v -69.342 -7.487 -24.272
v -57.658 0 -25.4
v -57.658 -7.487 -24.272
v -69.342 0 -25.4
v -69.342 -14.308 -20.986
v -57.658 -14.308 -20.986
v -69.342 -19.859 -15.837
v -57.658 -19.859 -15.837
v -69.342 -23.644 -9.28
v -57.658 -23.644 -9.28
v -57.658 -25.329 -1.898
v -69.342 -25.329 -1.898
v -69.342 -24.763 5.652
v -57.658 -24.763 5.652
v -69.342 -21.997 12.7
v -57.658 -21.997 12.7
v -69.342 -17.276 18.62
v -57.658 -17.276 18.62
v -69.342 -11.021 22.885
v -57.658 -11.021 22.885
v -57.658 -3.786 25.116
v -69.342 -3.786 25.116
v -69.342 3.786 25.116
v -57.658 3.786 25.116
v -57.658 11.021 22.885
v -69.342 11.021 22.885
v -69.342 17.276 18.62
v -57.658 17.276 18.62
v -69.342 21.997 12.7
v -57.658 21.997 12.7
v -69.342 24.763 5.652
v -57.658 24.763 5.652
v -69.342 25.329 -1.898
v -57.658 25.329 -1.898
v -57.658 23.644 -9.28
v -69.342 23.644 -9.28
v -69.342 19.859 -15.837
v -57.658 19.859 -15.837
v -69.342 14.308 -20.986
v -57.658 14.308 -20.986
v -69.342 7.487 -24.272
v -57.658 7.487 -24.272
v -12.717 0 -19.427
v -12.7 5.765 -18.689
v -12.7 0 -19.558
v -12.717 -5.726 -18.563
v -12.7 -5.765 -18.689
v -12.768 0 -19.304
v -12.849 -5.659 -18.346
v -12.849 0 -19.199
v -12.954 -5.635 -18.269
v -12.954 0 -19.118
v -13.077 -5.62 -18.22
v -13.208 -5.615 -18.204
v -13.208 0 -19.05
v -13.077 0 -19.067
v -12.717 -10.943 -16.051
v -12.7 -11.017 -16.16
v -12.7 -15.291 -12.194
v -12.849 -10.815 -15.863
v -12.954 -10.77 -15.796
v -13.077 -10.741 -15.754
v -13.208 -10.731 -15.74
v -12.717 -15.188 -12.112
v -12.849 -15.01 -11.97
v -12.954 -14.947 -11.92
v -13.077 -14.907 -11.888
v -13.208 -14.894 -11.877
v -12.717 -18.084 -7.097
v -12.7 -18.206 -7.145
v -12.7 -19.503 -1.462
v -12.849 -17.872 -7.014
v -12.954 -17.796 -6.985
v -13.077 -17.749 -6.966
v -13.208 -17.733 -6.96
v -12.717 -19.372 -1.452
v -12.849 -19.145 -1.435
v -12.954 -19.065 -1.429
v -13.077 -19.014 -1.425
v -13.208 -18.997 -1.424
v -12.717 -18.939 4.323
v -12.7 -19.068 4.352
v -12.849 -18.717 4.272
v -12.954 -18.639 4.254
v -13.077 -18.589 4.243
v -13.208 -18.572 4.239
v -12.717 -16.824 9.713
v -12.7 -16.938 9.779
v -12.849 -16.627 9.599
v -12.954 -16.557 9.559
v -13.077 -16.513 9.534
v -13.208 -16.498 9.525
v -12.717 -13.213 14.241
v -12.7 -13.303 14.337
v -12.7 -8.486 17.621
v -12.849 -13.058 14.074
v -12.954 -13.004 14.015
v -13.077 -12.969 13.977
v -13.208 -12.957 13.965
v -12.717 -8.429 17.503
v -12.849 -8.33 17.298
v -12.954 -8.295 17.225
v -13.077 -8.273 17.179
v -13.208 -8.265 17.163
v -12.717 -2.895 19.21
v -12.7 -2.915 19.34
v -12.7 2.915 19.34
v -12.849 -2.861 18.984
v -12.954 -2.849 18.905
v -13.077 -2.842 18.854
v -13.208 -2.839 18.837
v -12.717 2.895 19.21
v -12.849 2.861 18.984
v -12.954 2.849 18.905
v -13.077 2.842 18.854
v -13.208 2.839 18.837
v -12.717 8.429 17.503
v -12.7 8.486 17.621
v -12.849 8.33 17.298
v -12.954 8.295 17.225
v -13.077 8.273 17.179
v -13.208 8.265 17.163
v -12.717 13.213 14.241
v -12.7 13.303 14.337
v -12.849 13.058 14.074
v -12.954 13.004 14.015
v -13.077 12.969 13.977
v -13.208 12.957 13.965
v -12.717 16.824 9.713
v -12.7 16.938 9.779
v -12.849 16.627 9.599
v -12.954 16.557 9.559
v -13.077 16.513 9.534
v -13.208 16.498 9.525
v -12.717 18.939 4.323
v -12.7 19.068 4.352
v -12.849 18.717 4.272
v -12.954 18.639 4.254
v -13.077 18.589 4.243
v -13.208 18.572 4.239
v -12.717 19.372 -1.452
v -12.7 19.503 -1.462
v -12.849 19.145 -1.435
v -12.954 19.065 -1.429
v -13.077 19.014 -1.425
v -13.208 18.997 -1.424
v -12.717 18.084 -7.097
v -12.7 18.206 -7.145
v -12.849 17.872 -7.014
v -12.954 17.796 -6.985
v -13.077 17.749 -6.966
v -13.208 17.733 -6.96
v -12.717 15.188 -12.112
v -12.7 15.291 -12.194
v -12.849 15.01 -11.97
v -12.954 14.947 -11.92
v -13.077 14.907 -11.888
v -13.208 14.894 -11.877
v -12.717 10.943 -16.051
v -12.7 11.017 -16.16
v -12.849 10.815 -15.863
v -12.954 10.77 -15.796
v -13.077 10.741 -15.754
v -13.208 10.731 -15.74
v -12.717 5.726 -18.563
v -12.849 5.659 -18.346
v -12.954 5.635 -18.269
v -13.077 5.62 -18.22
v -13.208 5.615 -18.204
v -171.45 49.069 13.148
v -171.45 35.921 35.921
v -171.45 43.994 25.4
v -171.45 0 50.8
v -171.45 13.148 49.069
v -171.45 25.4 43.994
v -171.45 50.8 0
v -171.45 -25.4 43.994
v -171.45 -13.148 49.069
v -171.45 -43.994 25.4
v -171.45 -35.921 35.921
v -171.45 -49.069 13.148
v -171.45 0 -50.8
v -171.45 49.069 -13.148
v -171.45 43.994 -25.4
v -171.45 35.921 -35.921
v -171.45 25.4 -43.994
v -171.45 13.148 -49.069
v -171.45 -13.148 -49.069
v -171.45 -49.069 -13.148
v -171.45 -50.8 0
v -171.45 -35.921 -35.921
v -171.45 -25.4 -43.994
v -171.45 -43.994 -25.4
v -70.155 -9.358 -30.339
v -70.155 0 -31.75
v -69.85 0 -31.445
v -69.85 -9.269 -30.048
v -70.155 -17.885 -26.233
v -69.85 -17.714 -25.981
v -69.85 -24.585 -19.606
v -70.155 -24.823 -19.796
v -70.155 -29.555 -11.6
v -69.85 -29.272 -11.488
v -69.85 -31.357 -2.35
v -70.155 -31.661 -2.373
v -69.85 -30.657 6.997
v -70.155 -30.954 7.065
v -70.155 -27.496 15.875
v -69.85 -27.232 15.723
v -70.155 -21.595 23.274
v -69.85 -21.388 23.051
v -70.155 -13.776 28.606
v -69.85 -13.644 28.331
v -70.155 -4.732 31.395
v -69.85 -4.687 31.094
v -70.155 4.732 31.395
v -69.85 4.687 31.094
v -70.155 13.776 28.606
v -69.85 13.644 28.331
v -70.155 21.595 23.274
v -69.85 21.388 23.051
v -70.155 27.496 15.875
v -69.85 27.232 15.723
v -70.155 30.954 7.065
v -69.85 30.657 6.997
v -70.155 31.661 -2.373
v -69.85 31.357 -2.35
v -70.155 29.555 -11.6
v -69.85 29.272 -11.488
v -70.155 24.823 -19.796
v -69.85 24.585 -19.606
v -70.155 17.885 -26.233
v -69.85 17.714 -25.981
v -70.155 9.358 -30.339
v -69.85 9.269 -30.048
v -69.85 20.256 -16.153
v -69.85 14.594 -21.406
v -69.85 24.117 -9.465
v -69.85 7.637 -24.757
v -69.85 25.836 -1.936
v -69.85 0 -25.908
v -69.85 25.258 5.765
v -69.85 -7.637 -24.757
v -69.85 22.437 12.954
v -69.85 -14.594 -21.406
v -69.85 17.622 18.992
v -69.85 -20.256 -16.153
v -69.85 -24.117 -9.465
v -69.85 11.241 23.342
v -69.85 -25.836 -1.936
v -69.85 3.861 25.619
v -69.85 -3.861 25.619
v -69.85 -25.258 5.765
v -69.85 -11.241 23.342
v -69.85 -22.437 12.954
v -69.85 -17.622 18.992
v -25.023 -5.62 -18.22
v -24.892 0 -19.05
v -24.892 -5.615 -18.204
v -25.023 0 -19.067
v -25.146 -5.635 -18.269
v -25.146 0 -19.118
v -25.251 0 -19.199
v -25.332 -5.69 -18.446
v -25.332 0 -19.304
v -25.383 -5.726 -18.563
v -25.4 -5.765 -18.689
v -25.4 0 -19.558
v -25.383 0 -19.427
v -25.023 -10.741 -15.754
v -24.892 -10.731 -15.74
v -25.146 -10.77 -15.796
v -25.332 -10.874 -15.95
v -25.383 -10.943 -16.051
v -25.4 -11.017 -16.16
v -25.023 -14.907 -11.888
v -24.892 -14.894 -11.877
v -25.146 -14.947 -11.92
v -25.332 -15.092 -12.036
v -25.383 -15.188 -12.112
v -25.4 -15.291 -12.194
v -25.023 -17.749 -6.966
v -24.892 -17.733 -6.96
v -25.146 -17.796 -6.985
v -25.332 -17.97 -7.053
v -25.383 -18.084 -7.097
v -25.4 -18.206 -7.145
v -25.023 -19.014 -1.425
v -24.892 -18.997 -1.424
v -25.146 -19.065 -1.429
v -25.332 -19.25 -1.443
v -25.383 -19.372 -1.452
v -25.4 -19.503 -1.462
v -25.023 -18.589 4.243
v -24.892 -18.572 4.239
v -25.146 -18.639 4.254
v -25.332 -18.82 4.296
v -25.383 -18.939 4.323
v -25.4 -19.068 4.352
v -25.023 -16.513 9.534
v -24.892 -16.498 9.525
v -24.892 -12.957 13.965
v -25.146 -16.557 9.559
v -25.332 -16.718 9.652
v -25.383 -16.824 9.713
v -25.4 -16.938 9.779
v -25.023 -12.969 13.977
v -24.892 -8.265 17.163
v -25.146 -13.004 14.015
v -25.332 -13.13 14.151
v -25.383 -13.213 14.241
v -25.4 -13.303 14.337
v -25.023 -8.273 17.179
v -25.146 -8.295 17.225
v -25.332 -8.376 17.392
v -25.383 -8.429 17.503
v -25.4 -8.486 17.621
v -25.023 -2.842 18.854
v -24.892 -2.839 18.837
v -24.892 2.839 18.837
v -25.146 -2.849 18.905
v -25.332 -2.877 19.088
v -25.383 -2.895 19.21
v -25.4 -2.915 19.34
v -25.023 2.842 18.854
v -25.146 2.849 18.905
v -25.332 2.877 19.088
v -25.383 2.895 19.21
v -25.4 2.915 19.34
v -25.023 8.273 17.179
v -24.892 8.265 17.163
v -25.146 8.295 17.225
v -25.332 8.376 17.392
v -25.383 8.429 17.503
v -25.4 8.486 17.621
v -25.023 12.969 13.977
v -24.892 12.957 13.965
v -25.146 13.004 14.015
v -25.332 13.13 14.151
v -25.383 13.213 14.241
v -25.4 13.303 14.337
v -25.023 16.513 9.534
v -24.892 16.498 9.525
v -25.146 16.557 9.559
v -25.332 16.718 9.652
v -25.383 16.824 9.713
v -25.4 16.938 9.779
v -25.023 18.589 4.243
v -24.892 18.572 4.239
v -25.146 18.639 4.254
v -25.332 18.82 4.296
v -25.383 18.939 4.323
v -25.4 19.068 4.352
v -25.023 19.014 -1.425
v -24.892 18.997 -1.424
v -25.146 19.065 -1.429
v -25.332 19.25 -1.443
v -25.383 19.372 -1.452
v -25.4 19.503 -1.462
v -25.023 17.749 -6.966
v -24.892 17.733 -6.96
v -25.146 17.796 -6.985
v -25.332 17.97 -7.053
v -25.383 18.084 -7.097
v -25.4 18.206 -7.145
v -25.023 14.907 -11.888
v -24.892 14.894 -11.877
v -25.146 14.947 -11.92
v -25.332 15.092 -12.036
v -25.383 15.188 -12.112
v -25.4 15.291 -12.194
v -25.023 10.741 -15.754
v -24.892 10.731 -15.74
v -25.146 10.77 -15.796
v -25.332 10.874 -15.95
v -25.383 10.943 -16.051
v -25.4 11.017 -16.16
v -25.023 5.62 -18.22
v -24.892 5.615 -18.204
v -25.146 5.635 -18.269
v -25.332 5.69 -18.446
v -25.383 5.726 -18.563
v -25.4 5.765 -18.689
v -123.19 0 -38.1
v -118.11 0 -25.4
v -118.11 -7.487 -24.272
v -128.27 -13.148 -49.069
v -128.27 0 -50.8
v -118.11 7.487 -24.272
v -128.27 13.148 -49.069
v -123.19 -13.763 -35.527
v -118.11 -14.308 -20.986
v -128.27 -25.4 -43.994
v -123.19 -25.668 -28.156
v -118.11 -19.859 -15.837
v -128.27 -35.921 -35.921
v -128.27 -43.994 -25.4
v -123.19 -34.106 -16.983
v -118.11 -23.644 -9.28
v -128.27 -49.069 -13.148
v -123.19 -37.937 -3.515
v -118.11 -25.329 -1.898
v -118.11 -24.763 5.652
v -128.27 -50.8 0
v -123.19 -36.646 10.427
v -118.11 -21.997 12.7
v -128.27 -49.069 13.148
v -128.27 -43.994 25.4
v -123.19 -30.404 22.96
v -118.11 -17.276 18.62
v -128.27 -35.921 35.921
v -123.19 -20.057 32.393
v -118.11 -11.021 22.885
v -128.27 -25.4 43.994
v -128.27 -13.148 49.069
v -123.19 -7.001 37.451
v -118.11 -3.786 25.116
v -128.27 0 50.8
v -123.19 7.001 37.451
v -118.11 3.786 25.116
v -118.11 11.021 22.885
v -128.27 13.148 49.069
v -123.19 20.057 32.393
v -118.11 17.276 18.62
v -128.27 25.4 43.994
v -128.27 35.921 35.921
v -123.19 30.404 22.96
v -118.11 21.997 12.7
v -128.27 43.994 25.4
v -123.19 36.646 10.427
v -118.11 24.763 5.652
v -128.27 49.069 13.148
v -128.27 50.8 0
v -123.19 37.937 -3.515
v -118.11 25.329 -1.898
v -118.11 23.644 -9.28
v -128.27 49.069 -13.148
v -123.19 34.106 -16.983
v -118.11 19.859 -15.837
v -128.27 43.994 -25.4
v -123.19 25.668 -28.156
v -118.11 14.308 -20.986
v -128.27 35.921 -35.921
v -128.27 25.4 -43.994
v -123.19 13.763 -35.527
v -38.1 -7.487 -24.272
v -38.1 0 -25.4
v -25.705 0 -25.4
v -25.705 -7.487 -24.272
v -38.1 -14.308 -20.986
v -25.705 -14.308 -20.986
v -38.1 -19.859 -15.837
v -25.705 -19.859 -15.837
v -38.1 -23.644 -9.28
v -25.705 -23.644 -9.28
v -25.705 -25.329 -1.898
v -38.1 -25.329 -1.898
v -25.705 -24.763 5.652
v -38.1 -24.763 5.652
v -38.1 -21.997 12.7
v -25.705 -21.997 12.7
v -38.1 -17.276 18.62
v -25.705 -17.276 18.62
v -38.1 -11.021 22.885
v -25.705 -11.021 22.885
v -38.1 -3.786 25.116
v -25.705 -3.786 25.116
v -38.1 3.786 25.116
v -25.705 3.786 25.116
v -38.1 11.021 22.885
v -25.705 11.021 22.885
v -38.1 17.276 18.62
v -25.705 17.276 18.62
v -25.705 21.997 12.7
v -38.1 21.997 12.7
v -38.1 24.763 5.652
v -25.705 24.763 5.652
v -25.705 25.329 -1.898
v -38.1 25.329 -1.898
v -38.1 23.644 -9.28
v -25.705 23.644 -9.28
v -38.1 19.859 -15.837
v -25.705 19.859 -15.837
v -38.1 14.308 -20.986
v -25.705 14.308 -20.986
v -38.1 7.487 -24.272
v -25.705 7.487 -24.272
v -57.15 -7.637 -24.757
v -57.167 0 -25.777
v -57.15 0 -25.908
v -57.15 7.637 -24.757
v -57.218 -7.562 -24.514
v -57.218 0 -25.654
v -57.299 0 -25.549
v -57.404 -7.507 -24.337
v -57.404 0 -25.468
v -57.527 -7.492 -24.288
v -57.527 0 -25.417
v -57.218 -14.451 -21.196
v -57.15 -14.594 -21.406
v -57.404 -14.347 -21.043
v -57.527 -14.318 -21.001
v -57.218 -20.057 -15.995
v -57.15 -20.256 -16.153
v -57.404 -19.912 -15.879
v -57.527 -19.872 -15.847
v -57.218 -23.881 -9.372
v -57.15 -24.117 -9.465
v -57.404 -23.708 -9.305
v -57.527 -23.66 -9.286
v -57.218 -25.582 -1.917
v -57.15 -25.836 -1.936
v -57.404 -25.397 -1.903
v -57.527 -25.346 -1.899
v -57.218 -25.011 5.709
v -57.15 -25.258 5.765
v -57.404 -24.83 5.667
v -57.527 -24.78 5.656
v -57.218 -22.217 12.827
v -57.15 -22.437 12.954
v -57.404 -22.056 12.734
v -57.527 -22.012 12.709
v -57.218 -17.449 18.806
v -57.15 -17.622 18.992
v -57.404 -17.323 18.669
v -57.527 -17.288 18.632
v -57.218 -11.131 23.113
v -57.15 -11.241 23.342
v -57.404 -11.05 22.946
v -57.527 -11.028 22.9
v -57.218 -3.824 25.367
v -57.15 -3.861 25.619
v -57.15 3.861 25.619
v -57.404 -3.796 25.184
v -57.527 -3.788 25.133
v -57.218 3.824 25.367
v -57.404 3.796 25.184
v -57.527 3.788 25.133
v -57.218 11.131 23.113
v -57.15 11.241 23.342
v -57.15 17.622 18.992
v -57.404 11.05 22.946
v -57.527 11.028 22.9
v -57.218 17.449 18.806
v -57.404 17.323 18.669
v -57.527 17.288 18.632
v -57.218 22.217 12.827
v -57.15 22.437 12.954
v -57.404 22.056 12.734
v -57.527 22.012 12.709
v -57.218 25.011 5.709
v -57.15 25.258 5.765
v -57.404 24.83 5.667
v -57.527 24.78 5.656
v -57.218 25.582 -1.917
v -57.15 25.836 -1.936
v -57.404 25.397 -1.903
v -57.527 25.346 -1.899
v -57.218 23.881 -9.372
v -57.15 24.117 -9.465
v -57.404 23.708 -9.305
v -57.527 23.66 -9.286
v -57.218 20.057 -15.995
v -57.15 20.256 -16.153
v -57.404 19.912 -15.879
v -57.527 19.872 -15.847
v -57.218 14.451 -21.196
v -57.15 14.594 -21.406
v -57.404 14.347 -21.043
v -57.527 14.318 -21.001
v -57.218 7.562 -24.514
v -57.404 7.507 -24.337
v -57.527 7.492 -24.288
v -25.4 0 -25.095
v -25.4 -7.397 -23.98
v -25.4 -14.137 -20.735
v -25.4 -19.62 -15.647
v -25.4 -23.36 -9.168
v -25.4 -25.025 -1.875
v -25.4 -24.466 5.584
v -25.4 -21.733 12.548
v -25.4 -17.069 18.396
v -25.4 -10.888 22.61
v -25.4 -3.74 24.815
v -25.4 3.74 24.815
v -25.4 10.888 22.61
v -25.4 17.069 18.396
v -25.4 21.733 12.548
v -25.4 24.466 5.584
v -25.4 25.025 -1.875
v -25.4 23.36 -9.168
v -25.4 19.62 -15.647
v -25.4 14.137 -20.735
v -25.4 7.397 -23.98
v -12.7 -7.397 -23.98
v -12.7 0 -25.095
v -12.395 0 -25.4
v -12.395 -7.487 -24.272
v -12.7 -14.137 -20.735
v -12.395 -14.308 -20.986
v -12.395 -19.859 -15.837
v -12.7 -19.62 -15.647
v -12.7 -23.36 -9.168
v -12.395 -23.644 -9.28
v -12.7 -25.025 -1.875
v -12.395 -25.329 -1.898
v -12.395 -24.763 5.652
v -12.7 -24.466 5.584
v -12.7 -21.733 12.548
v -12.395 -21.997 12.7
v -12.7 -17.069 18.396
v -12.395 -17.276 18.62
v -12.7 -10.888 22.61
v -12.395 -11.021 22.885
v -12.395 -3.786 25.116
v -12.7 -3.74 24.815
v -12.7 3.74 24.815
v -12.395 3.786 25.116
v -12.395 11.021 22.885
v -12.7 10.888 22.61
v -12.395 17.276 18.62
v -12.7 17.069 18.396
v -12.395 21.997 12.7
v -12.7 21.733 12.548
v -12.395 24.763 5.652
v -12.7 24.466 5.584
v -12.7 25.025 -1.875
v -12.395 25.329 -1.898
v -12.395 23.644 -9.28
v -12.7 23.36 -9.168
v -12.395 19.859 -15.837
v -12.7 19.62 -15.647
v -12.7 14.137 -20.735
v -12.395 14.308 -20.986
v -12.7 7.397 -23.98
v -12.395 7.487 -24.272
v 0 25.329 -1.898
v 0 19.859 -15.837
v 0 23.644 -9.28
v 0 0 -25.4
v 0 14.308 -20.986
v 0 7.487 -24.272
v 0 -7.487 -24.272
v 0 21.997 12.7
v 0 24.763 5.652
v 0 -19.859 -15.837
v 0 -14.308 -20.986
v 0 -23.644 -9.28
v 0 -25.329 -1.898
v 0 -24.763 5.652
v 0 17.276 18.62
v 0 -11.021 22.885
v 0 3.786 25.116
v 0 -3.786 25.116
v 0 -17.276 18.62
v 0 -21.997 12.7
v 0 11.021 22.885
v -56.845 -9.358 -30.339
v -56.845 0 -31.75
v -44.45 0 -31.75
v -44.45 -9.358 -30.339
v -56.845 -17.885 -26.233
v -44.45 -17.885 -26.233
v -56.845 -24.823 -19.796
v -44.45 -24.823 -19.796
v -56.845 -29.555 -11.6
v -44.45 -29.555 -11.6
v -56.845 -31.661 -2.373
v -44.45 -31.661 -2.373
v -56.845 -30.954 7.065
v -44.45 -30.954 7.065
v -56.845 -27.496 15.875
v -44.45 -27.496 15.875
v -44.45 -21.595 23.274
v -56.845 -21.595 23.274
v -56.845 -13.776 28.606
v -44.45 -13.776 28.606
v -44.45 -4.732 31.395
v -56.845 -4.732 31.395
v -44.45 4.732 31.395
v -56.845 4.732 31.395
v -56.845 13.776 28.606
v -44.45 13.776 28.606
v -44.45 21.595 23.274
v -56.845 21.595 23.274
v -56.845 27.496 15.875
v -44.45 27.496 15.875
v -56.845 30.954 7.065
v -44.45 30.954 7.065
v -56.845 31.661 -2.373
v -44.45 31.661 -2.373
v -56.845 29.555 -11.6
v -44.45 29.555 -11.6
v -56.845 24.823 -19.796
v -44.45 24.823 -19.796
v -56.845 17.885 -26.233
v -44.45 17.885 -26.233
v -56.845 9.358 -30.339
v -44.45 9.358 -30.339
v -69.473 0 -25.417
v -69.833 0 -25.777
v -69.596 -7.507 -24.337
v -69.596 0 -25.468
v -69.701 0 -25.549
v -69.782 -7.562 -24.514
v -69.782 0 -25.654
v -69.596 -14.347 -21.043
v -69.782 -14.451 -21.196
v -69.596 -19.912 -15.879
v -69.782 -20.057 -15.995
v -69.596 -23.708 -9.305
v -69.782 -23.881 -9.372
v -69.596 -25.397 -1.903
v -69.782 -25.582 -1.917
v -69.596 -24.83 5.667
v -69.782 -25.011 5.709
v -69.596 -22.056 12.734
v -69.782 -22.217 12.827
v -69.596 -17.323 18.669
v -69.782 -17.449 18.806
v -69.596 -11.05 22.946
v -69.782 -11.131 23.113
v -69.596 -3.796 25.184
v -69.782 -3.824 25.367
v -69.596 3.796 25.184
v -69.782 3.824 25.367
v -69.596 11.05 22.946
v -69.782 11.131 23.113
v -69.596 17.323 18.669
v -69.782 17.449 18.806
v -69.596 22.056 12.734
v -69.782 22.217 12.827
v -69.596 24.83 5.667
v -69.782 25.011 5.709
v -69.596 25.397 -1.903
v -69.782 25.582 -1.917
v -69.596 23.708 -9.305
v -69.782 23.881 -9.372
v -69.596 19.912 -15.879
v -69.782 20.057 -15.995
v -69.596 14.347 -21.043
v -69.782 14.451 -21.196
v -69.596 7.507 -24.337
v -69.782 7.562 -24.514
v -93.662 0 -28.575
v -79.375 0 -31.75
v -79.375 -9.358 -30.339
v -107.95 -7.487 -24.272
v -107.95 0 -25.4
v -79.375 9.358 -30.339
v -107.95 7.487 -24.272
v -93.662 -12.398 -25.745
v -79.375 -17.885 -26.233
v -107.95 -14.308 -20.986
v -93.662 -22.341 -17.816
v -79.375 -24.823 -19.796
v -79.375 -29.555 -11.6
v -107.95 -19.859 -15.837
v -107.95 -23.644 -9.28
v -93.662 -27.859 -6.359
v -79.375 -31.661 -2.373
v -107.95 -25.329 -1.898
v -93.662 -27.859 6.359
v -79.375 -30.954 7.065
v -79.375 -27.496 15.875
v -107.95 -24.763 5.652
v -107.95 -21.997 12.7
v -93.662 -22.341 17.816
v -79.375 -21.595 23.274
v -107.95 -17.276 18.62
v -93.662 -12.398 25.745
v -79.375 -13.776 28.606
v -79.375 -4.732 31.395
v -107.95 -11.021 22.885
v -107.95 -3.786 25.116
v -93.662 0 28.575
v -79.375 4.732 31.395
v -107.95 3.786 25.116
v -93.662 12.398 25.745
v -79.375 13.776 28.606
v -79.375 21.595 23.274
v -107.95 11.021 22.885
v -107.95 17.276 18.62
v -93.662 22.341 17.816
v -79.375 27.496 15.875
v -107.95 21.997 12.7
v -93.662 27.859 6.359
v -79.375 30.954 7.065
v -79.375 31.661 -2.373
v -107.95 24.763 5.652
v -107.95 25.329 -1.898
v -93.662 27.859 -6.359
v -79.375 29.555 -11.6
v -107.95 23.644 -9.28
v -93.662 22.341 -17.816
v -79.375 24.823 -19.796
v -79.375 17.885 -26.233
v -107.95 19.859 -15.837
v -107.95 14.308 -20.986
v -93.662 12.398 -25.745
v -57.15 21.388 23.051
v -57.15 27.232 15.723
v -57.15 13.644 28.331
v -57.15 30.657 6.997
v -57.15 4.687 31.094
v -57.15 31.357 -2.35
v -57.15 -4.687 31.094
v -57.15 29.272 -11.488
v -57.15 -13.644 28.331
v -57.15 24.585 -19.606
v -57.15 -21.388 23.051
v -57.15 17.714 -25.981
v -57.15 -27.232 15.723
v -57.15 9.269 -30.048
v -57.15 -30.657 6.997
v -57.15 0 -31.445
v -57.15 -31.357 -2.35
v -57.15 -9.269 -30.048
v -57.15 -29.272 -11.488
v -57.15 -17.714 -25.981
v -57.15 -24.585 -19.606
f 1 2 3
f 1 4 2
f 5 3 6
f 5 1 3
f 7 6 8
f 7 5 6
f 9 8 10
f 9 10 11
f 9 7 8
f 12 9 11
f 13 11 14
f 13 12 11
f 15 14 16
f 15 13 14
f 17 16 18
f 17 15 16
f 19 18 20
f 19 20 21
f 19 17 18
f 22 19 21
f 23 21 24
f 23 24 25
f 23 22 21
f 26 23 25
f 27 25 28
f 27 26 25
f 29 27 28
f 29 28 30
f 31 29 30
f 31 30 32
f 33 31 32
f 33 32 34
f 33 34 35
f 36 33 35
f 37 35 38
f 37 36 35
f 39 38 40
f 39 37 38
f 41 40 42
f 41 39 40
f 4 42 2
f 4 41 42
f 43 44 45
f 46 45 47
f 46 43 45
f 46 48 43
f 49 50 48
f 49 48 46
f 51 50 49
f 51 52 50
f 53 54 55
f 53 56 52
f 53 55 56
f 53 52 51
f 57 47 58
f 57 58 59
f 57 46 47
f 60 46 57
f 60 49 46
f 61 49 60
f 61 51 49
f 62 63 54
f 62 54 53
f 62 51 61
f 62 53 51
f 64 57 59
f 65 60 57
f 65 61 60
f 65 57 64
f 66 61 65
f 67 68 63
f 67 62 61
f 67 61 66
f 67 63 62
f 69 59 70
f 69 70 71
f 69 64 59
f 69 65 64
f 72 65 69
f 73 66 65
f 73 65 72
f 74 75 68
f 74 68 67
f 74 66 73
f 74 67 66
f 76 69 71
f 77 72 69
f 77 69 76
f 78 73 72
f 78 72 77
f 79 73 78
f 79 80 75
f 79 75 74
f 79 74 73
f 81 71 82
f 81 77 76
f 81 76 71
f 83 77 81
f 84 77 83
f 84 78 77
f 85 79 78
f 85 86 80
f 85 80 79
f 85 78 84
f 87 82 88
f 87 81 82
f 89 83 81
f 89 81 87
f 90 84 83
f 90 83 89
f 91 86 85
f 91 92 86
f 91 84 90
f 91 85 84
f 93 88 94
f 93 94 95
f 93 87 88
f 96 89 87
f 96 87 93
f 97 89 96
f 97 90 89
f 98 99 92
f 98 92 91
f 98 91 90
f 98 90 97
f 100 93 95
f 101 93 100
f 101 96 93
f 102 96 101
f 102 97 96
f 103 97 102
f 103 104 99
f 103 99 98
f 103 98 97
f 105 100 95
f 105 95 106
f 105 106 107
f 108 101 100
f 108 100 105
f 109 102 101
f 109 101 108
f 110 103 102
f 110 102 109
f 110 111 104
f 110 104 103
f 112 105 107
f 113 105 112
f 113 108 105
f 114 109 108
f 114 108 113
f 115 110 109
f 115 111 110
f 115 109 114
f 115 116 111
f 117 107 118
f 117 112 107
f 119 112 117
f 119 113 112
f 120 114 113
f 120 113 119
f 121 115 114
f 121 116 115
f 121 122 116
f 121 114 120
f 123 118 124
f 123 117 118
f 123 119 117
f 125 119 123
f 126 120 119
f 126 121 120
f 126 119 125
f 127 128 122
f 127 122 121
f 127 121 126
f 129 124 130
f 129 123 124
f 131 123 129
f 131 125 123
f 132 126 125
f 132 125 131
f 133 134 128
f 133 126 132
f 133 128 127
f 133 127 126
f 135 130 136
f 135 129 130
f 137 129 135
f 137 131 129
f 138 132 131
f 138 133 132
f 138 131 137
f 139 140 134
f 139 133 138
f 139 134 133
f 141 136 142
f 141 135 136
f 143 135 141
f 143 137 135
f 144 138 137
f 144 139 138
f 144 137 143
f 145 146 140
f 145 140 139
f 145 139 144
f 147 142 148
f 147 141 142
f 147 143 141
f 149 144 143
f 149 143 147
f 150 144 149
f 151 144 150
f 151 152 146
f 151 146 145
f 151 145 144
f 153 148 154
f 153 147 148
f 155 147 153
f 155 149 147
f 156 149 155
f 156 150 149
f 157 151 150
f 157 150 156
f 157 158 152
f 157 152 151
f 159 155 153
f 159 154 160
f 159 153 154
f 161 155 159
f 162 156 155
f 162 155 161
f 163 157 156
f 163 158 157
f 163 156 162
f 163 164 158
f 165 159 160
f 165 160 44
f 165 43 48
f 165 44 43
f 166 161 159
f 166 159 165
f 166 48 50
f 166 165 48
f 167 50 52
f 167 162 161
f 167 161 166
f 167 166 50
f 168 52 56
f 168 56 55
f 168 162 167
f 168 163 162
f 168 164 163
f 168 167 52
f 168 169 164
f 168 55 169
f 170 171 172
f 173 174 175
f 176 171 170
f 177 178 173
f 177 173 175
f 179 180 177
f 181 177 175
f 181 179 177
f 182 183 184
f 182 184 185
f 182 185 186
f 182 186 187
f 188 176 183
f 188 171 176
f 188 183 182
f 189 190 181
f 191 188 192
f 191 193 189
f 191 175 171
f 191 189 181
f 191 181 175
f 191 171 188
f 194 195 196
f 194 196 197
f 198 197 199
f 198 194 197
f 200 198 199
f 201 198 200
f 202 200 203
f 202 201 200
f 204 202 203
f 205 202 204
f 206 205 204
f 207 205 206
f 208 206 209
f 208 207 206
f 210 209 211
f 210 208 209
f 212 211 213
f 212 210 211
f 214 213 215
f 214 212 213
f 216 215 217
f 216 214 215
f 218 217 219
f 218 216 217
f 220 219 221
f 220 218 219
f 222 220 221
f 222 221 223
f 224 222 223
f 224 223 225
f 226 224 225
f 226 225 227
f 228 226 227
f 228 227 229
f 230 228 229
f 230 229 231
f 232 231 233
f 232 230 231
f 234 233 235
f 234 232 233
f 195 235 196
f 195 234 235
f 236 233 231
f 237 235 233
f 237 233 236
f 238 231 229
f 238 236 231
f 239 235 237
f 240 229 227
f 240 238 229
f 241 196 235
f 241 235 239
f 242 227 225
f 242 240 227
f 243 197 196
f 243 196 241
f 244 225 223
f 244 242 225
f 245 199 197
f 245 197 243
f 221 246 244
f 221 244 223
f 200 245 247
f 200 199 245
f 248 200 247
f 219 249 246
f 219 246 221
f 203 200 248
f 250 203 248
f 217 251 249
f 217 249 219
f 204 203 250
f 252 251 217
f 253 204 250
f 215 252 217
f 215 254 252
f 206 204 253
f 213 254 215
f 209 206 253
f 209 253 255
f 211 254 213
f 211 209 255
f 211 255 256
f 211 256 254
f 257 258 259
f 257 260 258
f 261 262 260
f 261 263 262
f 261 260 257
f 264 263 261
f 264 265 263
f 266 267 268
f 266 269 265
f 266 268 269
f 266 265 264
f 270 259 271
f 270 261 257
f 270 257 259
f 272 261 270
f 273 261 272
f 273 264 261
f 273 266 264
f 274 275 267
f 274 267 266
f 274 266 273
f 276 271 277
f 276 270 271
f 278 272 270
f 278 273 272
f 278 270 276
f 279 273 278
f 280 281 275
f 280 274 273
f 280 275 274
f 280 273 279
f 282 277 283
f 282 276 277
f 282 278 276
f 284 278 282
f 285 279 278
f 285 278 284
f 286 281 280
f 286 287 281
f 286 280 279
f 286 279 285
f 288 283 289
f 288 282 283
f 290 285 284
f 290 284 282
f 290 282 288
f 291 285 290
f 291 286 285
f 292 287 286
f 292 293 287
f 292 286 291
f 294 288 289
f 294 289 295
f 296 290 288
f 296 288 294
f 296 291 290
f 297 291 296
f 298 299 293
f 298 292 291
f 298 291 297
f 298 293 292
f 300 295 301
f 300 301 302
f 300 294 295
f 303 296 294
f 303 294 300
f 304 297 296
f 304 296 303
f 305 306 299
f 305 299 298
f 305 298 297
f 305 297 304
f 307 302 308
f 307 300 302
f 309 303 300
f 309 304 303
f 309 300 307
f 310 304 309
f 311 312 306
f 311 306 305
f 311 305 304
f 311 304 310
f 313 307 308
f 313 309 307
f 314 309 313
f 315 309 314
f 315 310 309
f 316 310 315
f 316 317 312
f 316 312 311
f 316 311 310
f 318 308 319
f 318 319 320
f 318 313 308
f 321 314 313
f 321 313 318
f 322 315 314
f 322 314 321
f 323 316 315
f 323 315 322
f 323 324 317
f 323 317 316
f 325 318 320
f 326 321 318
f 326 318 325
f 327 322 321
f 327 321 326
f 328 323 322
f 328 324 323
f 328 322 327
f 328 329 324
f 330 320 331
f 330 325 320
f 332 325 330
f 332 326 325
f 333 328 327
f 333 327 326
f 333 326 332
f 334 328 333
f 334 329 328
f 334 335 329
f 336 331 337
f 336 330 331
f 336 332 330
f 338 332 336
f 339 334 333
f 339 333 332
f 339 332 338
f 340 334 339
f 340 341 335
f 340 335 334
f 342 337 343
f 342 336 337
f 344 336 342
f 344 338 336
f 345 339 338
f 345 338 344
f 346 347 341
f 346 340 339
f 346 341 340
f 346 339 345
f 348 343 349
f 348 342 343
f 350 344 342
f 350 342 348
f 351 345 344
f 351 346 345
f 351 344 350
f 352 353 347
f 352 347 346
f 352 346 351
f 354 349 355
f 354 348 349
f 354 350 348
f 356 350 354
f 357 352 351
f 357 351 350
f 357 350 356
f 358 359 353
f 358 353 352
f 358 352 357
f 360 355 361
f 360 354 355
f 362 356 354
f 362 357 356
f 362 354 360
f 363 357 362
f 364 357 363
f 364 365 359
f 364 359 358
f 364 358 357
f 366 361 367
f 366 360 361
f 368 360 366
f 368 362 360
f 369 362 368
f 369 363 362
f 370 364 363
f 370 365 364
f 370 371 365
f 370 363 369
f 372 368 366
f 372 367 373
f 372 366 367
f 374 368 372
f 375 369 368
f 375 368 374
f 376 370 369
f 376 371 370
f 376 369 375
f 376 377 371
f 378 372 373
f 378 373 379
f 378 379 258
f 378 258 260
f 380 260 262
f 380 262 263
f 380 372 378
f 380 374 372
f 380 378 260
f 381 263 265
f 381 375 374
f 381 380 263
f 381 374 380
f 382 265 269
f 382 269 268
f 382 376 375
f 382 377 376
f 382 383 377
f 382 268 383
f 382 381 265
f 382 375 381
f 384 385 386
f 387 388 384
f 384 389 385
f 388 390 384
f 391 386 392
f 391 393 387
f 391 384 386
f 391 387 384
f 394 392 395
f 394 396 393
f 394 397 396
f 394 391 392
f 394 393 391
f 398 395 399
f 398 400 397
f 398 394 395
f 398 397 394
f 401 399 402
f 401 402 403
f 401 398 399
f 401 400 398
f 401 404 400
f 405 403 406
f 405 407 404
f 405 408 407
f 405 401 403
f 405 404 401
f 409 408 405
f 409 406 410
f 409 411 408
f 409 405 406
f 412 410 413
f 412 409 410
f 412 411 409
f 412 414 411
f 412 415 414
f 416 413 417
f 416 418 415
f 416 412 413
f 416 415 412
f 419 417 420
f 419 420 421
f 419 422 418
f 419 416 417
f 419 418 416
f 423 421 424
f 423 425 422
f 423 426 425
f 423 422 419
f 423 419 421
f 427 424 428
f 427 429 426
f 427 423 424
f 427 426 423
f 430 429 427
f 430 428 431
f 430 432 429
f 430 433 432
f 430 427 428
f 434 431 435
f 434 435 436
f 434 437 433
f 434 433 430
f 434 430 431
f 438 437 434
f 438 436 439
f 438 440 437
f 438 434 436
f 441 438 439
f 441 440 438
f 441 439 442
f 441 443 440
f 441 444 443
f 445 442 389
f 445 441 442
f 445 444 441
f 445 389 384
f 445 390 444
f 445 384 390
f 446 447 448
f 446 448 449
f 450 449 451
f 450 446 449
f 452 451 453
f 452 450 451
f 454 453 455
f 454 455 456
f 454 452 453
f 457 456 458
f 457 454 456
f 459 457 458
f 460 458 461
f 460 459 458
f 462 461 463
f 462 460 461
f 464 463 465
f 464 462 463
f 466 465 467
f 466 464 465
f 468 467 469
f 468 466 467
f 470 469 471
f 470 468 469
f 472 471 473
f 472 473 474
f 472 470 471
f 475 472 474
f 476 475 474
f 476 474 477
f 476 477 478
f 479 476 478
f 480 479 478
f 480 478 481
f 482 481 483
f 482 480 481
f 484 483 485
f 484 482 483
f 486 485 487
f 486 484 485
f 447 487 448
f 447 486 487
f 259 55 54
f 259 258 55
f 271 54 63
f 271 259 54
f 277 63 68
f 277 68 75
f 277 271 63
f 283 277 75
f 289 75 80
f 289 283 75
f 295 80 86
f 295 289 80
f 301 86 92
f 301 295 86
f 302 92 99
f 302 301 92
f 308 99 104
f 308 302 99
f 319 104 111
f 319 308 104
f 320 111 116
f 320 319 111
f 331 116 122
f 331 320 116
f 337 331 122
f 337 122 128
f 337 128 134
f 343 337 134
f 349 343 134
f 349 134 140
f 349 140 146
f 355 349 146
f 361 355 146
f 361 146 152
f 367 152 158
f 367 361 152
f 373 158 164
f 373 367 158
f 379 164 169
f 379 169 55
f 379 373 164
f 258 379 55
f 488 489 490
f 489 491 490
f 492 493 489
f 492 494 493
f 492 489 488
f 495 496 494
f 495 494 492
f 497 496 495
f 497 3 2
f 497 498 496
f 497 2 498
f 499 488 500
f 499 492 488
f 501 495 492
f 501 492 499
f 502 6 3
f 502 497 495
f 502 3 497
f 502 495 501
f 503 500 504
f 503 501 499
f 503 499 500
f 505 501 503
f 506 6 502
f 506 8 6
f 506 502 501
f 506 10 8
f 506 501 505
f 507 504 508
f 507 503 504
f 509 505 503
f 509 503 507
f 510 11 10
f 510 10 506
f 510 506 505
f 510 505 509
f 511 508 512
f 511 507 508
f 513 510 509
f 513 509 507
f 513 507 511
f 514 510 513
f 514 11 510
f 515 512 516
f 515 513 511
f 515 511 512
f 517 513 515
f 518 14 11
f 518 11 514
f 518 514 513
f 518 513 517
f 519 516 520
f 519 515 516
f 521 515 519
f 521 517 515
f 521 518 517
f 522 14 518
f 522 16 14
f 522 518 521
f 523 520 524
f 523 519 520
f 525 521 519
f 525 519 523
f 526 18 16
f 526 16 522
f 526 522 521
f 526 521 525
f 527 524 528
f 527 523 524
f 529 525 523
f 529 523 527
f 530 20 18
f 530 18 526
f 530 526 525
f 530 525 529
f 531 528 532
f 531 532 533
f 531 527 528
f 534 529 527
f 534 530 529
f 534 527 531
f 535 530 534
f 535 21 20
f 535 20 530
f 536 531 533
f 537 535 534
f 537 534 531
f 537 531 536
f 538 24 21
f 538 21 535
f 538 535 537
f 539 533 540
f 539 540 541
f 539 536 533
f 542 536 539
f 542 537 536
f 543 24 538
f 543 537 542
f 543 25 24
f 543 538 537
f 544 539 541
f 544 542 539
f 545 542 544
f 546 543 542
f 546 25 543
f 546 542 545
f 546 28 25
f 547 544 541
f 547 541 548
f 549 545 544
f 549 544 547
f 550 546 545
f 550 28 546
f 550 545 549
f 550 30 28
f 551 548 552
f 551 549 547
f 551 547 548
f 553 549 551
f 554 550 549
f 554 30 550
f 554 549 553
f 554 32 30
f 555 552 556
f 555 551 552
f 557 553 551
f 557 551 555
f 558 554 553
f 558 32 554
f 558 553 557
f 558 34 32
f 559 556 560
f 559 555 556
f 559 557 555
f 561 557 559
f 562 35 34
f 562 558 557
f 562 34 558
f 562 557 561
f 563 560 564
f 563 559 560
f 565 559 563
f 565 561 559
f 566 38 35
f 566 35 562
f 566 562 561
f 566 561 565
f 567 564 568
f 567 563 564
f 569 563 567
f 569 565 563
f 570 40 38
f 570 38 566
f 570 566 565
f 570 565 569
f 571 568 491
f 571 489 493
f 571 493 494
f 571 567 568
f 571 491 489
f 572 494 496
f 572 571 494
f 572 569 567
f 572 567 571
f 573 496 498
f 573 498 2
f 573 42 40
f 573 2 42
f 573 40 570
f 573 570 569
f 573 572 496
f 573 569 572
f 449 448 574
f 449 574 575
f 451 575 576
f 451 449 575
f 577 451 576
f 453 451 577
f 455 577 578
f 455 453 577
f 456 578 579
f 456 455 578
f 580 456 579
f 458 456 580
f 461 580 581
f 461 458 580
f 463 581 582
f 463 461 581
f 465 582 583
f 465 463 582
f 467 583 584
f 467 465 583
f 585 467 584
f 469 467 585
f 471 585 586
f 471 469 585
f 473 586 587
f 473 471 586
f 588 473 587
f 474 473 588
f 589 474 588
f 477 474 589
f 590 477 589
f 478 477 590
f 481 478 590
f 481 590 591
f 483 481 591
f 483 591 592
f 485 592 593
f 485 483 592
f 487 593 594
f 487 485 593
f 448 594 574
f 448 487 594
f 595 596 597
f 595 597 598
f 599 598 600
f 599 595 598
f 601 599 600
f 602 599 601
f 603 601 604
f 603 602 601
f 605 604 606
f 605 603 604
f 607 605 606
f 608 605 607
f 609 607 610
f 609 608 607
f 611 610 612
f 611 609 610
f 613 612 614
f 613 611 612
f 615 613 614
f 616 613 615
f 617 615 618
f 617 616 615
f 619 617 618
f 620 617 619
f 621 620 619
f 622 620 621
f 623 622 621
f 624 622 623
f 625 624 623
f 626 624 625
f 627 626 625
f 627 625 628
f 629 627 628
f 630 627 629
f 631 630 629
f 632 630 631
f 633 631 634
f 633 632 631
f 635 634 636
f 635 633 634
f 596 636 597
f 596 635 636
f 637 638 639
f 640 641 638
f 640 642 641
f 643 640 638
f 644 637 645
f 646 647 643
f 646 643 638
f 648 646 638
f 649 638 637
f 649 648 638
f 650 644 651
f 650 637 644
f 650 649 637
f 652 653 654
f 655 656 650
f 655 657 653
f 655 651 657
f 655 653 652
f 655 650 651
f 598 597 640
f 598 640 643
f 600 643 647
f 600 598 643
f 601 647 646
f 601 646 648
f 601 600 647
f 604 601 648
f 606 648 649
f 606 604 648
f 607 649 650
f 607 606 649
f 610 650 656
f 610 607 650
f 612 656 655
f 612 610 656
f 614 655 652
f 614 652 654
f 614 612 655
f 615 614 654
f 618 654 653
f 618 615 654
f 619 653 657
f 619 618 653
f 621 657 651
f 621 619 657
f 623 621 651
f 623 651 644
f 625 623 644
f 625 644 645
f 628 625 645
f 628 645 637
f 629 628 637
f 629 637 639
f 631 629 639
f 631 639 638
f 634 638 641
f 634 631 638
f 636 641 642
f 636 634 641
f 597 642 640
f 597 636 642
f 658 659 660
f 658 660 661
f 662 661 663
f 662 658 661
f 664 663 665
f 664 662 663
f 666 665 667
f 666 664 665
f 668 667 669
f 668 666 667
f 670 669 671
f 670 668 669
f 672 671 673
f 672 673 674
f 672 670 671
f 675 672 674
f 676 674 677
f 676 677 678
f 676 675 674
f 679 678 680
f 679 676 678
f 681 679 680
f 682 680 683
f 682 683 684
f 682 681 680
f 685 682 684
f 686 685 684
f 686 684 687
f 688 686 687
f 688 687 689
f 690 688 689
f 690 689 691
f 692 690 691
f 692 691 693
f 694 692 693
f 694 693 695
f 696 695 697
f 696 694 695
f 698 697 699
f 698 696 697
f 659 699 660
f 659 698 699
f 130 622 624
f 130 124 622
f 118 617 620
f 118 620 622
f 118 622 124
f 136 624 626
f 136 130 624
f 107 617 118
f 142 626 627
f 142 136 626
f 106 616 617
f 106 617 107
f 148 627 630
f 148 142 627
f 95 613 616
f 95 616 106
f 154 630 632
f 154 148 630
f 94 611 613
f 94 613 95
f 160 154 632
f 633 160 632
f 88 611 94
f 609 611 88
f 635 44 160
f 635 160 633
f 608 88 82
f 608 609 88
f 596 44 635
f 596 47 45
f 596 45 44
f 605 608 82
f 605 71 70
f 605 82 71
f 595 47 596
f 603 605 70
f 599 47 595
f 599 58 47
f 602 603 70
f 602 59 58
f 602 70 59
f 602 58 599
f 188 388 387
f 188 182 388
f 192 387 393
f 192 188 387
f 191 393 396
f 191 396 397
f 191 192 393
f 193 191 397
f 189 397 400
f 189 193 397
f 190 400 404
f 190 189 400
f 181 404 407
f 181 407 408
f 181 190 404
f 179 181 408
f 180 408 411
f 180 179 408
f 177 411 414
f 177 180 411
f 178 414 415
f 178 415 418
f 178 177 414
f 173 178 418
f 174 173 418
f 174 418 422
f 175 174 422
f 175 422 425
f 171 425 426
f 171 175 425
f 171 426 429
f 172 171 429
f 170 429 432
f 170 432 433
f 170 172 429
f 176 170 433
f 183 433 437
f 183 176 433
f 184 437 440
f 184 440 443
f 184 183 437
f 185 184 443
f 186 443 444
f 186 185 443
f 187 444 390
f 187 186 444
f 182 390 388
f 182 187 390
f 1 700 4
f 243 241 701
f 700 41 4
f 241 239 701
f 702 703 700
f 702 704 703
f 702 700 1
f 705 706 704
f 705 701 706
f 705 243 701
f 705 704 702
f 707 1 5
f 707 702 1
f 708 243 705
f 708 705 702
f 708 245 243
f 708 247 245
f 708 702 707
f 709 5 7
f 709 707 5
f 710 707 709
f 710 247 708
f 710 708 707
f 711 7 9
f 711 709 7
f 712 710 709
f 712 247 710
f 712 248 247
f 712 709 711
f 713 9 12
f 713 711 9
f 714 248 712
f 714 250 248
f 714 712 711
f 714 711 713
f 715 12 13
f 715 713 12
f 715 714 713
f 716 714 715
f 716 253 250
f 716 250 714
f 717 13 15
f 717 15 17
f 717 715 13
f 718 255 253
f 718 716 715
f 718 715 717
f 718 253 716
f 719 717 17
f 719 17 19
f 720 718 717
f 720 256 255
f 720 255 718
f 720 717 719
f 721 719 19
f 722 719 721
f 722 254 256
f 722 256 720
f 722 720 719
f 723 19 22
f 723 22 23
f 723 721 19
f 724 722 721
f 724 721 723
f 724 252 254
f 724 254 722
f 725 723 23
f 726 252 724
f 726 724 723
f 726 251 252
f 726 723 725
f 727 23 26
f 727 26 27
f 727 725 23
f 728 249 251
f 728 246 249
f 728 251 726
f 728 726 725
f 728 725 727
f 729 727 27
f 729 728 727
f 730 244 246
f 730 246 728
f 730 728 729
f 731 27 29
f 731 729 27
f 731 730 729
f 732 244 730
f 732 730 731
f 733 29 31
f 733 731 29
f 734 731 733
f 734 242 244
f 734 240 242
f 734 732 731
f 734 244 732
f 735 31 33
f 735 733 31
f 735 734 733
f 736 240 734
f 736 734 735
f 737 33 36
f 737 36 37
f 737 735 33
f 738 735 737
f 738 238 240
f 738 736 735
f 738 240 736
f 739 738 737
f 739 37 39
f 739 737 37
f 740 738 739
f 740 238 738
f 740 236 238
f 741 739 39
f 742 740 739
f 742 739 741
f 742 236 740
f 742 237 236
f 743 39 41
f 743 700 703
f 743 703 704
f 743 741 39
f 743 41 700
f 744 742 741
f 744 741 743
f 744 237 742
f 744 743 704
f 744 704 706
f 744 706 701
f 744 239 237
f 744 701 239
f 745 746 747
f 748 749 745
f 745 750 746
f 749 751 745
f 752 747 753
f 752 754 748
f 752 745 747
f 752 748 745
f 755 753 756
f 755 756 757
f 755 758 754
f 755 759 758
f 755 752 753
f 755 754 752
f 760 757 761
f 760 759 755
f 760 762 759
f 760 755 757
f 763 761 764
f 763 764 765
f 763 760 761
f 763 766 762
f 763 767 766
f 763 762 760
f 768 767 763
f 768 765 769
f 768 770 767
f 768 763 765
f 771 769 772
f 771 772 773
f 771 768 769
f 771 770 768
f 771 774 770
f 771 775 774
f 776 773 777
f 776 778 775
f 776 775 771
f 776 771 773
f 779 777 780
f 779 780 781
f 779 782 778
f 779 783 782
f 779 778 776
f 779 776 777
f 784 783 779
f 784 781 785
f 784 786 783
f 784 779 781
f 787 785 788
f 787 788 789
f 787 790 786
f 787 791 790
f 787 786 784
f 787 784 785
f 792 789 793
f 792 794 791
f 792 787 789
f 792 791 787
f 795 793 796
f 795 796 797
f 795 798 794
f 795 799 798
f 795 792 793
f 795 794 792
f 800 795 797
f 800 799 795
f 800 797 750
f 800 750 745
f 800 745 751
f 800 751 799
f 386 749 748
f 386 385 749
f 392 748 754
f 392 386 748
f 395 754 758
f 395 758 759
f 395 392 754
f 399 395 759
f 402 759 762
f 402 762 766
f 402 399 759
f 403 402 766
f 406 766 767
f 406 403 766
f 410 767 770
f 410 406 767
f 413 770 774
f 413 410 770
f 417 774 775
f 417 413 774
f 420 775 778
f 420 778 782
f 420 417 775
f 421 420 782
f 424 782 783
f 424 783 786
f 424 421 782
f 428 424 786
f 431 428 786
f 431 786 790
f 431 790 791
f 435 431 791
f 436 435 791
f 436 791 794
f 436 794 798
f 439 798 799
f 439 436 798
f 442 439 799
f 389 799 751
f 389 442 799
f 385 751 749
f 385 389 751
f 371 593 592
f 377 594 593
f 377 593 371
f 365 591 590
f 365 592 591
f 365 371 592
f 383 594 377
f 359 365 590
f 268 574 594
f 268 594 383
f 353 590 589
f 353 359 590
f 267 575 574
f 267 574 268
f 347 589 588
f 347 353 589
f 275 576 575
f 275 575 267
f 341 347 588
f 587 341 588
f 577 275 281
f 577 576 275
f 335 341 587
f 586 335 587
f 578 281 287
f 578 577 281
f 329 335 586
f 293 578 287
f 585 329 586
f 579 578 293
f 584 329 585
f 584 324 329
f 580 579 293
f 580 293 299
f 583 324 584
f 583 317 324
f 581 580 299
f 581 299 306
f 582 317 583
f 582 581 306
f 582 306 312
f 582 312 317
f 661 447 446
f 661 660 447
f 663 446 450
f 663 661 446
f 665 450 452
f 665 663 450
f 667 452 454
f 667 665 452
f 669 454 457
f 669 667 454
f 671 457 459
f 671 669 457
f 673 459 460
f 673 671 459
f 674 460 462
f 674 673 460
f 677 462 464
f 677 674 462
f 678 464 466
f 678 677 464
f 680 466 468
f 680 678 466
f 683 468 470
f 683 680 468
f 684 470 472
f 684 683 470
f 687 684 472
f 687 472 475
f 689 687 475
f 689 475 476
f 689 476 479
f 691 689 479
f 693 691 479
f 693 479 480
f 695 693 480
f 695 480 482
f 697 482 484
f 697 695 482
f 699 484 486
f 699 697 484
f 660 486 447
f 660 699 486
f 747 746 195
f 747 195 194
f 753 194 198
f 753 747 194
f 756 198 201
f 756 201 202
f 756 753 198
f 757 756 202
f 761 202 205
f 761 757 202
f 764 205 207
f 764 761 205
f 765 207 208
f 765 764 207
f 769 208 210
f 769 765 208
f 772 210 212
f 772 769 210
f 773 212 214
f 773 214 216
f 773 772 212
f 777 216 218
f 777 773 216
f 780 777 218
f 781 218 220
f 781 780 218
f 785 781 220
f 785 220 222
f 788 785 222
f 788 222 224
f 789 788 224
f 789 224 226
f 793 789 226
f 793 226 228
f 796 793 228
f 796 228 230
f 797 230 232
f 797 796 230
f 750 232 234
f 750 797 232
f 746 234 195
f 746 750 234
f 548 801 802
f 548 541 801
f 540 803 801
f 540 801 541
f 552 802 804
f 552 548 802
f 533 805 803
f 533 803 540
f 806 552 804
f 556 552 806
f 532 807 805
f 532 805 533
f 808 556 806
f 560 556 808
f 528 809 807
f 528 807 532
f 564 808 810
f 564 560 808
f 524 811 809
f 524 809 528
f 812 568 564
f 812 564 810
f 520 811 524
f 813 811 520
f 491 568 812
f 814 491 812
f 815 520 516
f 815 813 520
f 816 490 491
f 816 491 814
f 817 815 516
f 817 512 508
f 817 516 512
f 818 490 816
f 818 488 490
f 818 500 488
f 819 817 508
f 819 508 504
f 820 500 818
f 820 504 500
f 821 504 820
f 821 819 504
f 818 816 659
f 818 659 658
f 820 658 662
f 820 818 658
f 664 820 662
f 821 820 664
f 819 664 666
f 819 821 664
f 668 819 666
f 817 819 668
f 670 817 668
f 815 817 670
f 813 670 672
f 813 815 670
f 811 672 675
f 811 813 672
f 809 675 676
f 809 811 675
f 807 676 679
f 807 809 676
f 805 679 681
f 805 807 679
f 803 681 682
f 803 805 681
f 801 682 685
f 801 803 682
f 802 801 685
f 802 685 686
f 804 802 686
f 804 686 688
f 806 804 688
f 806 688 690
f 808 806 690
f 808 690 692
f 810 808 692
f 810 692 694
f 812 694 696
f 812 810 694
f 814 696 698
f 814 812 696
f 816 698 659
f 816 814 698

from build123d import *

# Parameters (mm, degrees)
CHAMFER1_SIZE = 0.3048


with BuildPart() as part:
    # Sketch1 → Base-Revolve (revolve)
    with BuildSketch(Plane.XY, mode=Mode.PRIVATE) as base_revolve_sk:
        with BuildLine():
            Line((0, 0), (0, 25.4))
            Line((0, 25.4), (-12.7, 25.4))
            Line((-12.7, 25.4), (-12.7, 19.558))
            ThreePointArc((-12.7, 19.558), (-12.848789755, 19.198789755), (-13.208, 19.05))
            Line((-13.208, 19.05), (-24.892, 19.05))
            ThreePointArc((-24.892, 19.05), (-25.251210245, 19.198789755), (-25.4, 19.558))
            Line((-25.4, 19.558), (-25.4, 25.4))
            Line((-25.4, 25.4), (-38.1, 25.4))
            Line((-38.1, 25.4), (-44.45, 31.75))
            Line((-44.45, 31.75), (-57.15, 31.75))
            Line((-57.15, 31.75), (-57.15, 25.908))
            ThreePointArc((-57.15, 25.908), (-57.298789755, 25.548789755), (-57.658, 25.4))
            Line((-57.658, 25.4), (-69.342, 25.4))
            ThreePointArc((-69.342, 25.4), (-69.701210245, 25.548789755), (-69.85, 25.908))
            Line((-69.85, 25.908), (-69.85, 31.75))
            Line((-69.85, 31.75), (-79.375, 31.75))
            Line((-79.375, 31.75), (-107.95, 25.4))
            Line((-107.95, 25.4), (-118.11, 25.4))
            Line((-118.11, 25.4), (-128.27, 50.8))
            Line((-128.27, 50.8), (-171.45, 50.8))
            Line((-171.45, 50.8), (-171.45, 0))
            Line((-171.45, 0), (0, 0))
        make_face()
    revolve(base_revolve_sk.sketch.rotate(Axis((0, 0, 0), (-1, 0, 0)), 90), axis=Axis((0, 0, 0), (-1, 0, 0)))

    # Chamfer1
    chamfer1_edges = [part.edges().sort_by_distance(p)[0] for p in [
        (-12.7, 0, 25.4),
        (-25.4, 0, 25.4),
        (-57.15, 0, 31.75),
        (-69.85, 0, 31.75),
    ]]
    chamfer(chamfer1_edges, length=CHAMFER1_SIZE)


solid = part.part
